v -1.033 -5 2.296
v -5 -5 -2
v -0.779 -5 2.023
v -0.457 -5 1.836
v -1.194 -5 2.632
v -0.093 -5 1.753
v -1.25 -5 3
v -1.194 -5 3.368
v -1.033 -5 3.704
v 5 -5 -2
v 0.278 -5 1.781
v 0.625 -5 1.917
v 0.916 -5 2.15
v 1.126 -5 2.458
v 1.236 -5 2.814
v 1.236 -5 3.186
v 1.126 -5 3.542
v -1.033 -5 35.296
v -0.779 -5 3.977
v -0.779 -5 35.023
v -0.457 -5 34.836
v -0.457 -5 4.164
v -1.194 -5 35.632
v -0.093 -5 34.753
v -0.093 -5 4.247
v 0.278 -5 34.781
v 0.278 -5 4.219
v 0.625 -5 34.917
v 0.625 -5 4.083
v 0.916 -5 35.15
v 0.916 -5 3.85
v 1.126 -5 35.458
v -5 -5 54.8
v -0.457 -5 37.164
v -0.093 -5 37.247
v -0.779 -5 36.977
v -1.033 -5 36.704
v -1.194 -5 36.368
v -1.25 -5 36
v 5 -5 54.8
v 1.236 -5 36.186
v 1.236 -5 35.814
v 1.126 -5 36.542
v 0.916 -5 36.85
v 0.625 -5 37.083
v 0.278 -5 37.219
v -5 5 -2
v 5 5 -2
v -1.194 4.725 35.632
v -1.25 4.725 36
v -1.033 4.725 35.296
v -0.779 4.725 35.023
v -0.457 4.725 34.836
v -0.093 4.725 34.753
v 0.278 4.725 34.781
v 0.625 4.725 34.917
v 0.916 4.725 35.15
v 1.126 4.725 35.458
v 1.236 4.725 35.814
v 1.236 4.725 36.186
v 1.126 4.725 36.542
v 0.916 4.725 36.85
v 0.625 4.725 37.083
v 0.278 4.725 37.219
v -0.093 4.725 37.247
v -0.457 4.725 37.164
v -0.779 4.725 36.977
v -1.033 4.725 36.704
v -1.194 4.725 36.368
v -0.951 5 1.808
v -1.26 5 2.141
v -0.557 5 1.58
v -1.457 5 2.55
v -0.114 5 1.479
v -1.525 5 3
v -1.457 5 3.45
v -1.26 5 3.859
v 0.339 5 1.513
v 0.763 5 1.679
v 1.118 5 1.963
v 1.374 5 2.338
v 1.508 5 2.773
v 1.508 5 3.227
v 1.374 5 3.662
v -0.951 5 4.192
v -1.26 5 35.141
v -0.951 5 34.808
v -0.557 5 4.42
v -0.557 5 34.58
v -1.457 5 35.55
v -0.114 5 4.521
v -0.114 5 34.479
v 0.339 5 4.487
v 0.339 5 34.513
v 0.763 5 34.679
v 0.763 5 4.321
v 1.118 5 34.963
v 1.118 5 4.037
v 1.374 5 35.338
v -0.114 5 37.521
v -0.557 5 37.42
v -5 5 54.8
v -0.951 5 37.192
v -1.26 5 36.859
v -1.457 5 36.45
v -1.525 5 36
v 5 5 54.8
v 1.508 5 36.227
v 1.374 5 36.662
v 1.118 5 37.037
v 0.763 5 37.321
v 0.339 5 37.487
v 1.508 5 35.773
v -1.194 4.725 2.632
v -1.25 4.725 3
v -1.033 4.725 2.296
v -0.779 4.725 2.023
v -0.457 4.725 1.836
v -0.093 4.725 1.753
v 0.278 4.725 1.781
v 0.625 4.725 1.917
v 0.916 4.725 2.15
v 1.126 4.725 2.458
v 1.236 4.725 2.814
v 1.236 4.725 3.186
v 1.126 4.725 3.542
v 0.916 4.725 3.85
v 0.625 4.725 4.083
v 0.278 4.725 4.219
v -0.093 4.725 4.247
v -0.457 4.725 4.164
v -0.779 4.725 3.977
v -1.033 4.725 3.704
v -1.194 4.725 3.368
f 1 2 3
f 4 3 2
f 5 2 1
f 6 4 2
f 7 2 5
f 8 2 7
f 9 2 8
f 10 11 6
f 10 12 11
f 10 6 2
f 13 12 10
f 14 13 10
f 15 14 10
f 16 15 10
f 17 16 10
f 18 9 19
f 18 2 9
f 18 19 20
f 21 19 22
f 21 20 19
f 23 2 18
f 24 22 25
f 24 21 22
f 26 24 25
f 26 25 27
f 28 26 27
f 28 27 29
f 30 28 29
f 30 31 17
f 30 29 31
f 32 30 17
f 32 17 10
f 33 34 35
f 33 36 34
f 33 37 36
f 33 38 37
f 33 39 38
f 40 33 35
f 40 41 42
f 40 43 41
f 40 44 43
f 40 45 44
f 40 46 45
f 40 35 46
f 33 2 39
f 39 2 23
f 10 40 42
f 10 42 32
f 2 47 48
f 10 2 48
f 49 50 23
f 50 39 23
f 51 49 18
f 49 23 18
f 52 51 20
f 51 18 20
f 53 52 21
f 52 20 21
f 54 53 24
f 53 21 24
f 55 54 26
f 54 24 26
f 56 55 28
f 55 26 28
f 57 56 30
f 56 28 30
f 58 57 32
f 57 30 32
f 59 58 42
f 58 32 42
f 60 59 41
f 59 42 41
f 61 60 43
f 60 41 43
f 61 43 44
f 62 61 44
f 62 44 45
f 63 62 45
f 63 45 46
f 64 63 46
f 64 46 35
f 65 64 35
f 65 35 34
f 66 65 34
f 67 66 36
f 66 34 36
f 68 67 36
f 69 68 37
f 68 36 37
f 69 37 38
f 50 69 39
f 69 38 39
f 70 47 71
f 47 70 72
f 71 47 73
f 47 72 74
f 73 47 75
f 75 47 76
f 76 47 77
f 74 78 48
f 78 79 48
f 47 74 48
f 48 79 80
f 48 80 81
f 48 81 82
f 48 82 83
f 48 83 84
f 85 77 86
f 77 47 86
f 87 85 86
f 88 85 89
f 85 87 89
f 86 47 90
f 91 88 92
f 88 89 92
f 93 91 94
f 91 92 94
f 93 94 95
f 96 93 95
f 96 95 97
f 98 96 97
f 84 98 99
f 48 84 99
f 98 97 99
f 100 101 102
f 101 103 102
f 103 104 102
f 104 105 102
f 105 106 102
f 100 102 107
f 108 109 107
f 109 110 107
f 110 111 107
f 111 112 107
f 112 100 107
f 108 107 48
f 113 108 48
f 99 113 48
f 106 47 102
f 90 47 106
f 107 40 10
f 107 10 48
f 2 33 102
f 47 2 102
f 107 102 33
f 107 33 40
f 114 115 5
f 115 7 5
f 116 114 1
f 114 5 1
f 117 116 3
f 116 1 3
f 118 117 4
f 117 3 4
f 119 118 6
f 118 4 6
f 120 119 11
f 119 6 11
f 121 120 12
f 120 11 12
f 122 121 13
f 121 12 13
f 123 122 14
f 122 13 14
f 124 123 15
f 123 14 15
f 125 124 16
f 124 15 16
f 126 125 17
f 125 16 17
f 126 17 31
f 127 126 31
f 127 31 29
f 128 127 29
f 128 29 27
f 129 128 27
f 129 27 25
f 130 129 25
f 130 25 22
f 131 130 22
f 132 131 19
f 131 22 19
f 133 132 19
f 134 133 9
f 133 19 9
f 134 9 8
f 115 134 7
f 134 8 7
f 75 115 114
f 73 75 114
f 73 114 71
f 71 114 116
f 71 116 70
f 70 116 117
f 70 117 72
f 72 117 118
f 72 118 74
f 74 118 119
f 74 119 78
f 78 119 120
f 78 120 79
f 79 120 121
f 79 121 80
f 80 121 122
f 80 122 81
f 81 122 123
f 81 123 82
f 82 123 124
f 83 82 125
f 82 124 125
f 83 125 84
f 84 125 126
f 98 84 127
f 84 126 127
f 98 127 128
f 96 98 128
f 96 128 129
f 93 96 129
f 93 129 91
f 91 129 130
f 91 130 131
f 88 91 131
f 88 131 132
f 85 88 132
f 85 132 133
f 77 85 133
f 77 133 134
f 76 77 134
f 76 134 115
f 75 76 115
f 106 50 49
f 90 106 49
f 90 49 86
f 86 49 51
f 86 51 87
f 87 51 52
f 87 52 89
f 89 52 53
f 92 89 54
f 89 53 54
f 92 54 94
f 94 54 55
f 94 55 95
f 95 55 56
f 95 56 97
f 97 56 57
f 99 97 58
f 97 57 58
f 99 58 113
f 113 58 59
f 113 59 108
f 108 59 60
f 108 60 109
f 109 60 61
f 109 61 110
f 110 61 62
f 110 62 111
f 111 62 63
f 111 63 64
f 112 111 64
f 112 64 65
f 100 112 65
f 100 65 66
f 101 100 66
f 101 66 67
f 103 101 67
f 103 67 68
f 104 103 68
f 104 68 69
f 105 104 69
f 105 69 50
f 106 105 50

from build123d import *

# Parameters (mm, degrees)
ESQUISSE1_W                     = 10
ESQUISSE1_H                     = 10
BOSS_EXTRU_1_DEPTH              = 54.8
BOSS_EXTRU_1_DEPTH_BACK         = 2
TROU_TARAUD_M3X0_51_D           = 2.5
TROU_TARAUD_M3X0_51_CSINK_D     = 3.05
TROU_TARAUD_M3X0_51_CSINK_ANGLE = 90


with BuildPart() as part:
    # Esquisse1 → Boss.-Extru.1 (new body, two sides)
    with BuildSketch(Plane.XY) as boss_extru_1_sk:
        Rectangle(ESQUISSE1_W, ESQUISSE1_H)
    extrude(amount=BOSS_EXTRU_1_DEPTH)
    extrude(boss_extru_1_sk.sketch, amount=-BOSS_EXTRU_1_DEPTH_BACK)

    # Trou taraud_ M3x0.51 (through all)
    with Locations(Plane(origin=(0, 5, 0), x_dir=(1, 0, 0), z_dir=(0, 1, 0))):
        with Locations((0, -36), (0, -3)):
            CounterSinkHole(TROU_TARAUD_M3X0_51_D / 2, TROU_TARAUD_M3X0_51_CSINK_D / 2, counter_sink_angle=TROU_TARAUD_M3X0_51_CSINK_ANGLE)


solid = part.part
